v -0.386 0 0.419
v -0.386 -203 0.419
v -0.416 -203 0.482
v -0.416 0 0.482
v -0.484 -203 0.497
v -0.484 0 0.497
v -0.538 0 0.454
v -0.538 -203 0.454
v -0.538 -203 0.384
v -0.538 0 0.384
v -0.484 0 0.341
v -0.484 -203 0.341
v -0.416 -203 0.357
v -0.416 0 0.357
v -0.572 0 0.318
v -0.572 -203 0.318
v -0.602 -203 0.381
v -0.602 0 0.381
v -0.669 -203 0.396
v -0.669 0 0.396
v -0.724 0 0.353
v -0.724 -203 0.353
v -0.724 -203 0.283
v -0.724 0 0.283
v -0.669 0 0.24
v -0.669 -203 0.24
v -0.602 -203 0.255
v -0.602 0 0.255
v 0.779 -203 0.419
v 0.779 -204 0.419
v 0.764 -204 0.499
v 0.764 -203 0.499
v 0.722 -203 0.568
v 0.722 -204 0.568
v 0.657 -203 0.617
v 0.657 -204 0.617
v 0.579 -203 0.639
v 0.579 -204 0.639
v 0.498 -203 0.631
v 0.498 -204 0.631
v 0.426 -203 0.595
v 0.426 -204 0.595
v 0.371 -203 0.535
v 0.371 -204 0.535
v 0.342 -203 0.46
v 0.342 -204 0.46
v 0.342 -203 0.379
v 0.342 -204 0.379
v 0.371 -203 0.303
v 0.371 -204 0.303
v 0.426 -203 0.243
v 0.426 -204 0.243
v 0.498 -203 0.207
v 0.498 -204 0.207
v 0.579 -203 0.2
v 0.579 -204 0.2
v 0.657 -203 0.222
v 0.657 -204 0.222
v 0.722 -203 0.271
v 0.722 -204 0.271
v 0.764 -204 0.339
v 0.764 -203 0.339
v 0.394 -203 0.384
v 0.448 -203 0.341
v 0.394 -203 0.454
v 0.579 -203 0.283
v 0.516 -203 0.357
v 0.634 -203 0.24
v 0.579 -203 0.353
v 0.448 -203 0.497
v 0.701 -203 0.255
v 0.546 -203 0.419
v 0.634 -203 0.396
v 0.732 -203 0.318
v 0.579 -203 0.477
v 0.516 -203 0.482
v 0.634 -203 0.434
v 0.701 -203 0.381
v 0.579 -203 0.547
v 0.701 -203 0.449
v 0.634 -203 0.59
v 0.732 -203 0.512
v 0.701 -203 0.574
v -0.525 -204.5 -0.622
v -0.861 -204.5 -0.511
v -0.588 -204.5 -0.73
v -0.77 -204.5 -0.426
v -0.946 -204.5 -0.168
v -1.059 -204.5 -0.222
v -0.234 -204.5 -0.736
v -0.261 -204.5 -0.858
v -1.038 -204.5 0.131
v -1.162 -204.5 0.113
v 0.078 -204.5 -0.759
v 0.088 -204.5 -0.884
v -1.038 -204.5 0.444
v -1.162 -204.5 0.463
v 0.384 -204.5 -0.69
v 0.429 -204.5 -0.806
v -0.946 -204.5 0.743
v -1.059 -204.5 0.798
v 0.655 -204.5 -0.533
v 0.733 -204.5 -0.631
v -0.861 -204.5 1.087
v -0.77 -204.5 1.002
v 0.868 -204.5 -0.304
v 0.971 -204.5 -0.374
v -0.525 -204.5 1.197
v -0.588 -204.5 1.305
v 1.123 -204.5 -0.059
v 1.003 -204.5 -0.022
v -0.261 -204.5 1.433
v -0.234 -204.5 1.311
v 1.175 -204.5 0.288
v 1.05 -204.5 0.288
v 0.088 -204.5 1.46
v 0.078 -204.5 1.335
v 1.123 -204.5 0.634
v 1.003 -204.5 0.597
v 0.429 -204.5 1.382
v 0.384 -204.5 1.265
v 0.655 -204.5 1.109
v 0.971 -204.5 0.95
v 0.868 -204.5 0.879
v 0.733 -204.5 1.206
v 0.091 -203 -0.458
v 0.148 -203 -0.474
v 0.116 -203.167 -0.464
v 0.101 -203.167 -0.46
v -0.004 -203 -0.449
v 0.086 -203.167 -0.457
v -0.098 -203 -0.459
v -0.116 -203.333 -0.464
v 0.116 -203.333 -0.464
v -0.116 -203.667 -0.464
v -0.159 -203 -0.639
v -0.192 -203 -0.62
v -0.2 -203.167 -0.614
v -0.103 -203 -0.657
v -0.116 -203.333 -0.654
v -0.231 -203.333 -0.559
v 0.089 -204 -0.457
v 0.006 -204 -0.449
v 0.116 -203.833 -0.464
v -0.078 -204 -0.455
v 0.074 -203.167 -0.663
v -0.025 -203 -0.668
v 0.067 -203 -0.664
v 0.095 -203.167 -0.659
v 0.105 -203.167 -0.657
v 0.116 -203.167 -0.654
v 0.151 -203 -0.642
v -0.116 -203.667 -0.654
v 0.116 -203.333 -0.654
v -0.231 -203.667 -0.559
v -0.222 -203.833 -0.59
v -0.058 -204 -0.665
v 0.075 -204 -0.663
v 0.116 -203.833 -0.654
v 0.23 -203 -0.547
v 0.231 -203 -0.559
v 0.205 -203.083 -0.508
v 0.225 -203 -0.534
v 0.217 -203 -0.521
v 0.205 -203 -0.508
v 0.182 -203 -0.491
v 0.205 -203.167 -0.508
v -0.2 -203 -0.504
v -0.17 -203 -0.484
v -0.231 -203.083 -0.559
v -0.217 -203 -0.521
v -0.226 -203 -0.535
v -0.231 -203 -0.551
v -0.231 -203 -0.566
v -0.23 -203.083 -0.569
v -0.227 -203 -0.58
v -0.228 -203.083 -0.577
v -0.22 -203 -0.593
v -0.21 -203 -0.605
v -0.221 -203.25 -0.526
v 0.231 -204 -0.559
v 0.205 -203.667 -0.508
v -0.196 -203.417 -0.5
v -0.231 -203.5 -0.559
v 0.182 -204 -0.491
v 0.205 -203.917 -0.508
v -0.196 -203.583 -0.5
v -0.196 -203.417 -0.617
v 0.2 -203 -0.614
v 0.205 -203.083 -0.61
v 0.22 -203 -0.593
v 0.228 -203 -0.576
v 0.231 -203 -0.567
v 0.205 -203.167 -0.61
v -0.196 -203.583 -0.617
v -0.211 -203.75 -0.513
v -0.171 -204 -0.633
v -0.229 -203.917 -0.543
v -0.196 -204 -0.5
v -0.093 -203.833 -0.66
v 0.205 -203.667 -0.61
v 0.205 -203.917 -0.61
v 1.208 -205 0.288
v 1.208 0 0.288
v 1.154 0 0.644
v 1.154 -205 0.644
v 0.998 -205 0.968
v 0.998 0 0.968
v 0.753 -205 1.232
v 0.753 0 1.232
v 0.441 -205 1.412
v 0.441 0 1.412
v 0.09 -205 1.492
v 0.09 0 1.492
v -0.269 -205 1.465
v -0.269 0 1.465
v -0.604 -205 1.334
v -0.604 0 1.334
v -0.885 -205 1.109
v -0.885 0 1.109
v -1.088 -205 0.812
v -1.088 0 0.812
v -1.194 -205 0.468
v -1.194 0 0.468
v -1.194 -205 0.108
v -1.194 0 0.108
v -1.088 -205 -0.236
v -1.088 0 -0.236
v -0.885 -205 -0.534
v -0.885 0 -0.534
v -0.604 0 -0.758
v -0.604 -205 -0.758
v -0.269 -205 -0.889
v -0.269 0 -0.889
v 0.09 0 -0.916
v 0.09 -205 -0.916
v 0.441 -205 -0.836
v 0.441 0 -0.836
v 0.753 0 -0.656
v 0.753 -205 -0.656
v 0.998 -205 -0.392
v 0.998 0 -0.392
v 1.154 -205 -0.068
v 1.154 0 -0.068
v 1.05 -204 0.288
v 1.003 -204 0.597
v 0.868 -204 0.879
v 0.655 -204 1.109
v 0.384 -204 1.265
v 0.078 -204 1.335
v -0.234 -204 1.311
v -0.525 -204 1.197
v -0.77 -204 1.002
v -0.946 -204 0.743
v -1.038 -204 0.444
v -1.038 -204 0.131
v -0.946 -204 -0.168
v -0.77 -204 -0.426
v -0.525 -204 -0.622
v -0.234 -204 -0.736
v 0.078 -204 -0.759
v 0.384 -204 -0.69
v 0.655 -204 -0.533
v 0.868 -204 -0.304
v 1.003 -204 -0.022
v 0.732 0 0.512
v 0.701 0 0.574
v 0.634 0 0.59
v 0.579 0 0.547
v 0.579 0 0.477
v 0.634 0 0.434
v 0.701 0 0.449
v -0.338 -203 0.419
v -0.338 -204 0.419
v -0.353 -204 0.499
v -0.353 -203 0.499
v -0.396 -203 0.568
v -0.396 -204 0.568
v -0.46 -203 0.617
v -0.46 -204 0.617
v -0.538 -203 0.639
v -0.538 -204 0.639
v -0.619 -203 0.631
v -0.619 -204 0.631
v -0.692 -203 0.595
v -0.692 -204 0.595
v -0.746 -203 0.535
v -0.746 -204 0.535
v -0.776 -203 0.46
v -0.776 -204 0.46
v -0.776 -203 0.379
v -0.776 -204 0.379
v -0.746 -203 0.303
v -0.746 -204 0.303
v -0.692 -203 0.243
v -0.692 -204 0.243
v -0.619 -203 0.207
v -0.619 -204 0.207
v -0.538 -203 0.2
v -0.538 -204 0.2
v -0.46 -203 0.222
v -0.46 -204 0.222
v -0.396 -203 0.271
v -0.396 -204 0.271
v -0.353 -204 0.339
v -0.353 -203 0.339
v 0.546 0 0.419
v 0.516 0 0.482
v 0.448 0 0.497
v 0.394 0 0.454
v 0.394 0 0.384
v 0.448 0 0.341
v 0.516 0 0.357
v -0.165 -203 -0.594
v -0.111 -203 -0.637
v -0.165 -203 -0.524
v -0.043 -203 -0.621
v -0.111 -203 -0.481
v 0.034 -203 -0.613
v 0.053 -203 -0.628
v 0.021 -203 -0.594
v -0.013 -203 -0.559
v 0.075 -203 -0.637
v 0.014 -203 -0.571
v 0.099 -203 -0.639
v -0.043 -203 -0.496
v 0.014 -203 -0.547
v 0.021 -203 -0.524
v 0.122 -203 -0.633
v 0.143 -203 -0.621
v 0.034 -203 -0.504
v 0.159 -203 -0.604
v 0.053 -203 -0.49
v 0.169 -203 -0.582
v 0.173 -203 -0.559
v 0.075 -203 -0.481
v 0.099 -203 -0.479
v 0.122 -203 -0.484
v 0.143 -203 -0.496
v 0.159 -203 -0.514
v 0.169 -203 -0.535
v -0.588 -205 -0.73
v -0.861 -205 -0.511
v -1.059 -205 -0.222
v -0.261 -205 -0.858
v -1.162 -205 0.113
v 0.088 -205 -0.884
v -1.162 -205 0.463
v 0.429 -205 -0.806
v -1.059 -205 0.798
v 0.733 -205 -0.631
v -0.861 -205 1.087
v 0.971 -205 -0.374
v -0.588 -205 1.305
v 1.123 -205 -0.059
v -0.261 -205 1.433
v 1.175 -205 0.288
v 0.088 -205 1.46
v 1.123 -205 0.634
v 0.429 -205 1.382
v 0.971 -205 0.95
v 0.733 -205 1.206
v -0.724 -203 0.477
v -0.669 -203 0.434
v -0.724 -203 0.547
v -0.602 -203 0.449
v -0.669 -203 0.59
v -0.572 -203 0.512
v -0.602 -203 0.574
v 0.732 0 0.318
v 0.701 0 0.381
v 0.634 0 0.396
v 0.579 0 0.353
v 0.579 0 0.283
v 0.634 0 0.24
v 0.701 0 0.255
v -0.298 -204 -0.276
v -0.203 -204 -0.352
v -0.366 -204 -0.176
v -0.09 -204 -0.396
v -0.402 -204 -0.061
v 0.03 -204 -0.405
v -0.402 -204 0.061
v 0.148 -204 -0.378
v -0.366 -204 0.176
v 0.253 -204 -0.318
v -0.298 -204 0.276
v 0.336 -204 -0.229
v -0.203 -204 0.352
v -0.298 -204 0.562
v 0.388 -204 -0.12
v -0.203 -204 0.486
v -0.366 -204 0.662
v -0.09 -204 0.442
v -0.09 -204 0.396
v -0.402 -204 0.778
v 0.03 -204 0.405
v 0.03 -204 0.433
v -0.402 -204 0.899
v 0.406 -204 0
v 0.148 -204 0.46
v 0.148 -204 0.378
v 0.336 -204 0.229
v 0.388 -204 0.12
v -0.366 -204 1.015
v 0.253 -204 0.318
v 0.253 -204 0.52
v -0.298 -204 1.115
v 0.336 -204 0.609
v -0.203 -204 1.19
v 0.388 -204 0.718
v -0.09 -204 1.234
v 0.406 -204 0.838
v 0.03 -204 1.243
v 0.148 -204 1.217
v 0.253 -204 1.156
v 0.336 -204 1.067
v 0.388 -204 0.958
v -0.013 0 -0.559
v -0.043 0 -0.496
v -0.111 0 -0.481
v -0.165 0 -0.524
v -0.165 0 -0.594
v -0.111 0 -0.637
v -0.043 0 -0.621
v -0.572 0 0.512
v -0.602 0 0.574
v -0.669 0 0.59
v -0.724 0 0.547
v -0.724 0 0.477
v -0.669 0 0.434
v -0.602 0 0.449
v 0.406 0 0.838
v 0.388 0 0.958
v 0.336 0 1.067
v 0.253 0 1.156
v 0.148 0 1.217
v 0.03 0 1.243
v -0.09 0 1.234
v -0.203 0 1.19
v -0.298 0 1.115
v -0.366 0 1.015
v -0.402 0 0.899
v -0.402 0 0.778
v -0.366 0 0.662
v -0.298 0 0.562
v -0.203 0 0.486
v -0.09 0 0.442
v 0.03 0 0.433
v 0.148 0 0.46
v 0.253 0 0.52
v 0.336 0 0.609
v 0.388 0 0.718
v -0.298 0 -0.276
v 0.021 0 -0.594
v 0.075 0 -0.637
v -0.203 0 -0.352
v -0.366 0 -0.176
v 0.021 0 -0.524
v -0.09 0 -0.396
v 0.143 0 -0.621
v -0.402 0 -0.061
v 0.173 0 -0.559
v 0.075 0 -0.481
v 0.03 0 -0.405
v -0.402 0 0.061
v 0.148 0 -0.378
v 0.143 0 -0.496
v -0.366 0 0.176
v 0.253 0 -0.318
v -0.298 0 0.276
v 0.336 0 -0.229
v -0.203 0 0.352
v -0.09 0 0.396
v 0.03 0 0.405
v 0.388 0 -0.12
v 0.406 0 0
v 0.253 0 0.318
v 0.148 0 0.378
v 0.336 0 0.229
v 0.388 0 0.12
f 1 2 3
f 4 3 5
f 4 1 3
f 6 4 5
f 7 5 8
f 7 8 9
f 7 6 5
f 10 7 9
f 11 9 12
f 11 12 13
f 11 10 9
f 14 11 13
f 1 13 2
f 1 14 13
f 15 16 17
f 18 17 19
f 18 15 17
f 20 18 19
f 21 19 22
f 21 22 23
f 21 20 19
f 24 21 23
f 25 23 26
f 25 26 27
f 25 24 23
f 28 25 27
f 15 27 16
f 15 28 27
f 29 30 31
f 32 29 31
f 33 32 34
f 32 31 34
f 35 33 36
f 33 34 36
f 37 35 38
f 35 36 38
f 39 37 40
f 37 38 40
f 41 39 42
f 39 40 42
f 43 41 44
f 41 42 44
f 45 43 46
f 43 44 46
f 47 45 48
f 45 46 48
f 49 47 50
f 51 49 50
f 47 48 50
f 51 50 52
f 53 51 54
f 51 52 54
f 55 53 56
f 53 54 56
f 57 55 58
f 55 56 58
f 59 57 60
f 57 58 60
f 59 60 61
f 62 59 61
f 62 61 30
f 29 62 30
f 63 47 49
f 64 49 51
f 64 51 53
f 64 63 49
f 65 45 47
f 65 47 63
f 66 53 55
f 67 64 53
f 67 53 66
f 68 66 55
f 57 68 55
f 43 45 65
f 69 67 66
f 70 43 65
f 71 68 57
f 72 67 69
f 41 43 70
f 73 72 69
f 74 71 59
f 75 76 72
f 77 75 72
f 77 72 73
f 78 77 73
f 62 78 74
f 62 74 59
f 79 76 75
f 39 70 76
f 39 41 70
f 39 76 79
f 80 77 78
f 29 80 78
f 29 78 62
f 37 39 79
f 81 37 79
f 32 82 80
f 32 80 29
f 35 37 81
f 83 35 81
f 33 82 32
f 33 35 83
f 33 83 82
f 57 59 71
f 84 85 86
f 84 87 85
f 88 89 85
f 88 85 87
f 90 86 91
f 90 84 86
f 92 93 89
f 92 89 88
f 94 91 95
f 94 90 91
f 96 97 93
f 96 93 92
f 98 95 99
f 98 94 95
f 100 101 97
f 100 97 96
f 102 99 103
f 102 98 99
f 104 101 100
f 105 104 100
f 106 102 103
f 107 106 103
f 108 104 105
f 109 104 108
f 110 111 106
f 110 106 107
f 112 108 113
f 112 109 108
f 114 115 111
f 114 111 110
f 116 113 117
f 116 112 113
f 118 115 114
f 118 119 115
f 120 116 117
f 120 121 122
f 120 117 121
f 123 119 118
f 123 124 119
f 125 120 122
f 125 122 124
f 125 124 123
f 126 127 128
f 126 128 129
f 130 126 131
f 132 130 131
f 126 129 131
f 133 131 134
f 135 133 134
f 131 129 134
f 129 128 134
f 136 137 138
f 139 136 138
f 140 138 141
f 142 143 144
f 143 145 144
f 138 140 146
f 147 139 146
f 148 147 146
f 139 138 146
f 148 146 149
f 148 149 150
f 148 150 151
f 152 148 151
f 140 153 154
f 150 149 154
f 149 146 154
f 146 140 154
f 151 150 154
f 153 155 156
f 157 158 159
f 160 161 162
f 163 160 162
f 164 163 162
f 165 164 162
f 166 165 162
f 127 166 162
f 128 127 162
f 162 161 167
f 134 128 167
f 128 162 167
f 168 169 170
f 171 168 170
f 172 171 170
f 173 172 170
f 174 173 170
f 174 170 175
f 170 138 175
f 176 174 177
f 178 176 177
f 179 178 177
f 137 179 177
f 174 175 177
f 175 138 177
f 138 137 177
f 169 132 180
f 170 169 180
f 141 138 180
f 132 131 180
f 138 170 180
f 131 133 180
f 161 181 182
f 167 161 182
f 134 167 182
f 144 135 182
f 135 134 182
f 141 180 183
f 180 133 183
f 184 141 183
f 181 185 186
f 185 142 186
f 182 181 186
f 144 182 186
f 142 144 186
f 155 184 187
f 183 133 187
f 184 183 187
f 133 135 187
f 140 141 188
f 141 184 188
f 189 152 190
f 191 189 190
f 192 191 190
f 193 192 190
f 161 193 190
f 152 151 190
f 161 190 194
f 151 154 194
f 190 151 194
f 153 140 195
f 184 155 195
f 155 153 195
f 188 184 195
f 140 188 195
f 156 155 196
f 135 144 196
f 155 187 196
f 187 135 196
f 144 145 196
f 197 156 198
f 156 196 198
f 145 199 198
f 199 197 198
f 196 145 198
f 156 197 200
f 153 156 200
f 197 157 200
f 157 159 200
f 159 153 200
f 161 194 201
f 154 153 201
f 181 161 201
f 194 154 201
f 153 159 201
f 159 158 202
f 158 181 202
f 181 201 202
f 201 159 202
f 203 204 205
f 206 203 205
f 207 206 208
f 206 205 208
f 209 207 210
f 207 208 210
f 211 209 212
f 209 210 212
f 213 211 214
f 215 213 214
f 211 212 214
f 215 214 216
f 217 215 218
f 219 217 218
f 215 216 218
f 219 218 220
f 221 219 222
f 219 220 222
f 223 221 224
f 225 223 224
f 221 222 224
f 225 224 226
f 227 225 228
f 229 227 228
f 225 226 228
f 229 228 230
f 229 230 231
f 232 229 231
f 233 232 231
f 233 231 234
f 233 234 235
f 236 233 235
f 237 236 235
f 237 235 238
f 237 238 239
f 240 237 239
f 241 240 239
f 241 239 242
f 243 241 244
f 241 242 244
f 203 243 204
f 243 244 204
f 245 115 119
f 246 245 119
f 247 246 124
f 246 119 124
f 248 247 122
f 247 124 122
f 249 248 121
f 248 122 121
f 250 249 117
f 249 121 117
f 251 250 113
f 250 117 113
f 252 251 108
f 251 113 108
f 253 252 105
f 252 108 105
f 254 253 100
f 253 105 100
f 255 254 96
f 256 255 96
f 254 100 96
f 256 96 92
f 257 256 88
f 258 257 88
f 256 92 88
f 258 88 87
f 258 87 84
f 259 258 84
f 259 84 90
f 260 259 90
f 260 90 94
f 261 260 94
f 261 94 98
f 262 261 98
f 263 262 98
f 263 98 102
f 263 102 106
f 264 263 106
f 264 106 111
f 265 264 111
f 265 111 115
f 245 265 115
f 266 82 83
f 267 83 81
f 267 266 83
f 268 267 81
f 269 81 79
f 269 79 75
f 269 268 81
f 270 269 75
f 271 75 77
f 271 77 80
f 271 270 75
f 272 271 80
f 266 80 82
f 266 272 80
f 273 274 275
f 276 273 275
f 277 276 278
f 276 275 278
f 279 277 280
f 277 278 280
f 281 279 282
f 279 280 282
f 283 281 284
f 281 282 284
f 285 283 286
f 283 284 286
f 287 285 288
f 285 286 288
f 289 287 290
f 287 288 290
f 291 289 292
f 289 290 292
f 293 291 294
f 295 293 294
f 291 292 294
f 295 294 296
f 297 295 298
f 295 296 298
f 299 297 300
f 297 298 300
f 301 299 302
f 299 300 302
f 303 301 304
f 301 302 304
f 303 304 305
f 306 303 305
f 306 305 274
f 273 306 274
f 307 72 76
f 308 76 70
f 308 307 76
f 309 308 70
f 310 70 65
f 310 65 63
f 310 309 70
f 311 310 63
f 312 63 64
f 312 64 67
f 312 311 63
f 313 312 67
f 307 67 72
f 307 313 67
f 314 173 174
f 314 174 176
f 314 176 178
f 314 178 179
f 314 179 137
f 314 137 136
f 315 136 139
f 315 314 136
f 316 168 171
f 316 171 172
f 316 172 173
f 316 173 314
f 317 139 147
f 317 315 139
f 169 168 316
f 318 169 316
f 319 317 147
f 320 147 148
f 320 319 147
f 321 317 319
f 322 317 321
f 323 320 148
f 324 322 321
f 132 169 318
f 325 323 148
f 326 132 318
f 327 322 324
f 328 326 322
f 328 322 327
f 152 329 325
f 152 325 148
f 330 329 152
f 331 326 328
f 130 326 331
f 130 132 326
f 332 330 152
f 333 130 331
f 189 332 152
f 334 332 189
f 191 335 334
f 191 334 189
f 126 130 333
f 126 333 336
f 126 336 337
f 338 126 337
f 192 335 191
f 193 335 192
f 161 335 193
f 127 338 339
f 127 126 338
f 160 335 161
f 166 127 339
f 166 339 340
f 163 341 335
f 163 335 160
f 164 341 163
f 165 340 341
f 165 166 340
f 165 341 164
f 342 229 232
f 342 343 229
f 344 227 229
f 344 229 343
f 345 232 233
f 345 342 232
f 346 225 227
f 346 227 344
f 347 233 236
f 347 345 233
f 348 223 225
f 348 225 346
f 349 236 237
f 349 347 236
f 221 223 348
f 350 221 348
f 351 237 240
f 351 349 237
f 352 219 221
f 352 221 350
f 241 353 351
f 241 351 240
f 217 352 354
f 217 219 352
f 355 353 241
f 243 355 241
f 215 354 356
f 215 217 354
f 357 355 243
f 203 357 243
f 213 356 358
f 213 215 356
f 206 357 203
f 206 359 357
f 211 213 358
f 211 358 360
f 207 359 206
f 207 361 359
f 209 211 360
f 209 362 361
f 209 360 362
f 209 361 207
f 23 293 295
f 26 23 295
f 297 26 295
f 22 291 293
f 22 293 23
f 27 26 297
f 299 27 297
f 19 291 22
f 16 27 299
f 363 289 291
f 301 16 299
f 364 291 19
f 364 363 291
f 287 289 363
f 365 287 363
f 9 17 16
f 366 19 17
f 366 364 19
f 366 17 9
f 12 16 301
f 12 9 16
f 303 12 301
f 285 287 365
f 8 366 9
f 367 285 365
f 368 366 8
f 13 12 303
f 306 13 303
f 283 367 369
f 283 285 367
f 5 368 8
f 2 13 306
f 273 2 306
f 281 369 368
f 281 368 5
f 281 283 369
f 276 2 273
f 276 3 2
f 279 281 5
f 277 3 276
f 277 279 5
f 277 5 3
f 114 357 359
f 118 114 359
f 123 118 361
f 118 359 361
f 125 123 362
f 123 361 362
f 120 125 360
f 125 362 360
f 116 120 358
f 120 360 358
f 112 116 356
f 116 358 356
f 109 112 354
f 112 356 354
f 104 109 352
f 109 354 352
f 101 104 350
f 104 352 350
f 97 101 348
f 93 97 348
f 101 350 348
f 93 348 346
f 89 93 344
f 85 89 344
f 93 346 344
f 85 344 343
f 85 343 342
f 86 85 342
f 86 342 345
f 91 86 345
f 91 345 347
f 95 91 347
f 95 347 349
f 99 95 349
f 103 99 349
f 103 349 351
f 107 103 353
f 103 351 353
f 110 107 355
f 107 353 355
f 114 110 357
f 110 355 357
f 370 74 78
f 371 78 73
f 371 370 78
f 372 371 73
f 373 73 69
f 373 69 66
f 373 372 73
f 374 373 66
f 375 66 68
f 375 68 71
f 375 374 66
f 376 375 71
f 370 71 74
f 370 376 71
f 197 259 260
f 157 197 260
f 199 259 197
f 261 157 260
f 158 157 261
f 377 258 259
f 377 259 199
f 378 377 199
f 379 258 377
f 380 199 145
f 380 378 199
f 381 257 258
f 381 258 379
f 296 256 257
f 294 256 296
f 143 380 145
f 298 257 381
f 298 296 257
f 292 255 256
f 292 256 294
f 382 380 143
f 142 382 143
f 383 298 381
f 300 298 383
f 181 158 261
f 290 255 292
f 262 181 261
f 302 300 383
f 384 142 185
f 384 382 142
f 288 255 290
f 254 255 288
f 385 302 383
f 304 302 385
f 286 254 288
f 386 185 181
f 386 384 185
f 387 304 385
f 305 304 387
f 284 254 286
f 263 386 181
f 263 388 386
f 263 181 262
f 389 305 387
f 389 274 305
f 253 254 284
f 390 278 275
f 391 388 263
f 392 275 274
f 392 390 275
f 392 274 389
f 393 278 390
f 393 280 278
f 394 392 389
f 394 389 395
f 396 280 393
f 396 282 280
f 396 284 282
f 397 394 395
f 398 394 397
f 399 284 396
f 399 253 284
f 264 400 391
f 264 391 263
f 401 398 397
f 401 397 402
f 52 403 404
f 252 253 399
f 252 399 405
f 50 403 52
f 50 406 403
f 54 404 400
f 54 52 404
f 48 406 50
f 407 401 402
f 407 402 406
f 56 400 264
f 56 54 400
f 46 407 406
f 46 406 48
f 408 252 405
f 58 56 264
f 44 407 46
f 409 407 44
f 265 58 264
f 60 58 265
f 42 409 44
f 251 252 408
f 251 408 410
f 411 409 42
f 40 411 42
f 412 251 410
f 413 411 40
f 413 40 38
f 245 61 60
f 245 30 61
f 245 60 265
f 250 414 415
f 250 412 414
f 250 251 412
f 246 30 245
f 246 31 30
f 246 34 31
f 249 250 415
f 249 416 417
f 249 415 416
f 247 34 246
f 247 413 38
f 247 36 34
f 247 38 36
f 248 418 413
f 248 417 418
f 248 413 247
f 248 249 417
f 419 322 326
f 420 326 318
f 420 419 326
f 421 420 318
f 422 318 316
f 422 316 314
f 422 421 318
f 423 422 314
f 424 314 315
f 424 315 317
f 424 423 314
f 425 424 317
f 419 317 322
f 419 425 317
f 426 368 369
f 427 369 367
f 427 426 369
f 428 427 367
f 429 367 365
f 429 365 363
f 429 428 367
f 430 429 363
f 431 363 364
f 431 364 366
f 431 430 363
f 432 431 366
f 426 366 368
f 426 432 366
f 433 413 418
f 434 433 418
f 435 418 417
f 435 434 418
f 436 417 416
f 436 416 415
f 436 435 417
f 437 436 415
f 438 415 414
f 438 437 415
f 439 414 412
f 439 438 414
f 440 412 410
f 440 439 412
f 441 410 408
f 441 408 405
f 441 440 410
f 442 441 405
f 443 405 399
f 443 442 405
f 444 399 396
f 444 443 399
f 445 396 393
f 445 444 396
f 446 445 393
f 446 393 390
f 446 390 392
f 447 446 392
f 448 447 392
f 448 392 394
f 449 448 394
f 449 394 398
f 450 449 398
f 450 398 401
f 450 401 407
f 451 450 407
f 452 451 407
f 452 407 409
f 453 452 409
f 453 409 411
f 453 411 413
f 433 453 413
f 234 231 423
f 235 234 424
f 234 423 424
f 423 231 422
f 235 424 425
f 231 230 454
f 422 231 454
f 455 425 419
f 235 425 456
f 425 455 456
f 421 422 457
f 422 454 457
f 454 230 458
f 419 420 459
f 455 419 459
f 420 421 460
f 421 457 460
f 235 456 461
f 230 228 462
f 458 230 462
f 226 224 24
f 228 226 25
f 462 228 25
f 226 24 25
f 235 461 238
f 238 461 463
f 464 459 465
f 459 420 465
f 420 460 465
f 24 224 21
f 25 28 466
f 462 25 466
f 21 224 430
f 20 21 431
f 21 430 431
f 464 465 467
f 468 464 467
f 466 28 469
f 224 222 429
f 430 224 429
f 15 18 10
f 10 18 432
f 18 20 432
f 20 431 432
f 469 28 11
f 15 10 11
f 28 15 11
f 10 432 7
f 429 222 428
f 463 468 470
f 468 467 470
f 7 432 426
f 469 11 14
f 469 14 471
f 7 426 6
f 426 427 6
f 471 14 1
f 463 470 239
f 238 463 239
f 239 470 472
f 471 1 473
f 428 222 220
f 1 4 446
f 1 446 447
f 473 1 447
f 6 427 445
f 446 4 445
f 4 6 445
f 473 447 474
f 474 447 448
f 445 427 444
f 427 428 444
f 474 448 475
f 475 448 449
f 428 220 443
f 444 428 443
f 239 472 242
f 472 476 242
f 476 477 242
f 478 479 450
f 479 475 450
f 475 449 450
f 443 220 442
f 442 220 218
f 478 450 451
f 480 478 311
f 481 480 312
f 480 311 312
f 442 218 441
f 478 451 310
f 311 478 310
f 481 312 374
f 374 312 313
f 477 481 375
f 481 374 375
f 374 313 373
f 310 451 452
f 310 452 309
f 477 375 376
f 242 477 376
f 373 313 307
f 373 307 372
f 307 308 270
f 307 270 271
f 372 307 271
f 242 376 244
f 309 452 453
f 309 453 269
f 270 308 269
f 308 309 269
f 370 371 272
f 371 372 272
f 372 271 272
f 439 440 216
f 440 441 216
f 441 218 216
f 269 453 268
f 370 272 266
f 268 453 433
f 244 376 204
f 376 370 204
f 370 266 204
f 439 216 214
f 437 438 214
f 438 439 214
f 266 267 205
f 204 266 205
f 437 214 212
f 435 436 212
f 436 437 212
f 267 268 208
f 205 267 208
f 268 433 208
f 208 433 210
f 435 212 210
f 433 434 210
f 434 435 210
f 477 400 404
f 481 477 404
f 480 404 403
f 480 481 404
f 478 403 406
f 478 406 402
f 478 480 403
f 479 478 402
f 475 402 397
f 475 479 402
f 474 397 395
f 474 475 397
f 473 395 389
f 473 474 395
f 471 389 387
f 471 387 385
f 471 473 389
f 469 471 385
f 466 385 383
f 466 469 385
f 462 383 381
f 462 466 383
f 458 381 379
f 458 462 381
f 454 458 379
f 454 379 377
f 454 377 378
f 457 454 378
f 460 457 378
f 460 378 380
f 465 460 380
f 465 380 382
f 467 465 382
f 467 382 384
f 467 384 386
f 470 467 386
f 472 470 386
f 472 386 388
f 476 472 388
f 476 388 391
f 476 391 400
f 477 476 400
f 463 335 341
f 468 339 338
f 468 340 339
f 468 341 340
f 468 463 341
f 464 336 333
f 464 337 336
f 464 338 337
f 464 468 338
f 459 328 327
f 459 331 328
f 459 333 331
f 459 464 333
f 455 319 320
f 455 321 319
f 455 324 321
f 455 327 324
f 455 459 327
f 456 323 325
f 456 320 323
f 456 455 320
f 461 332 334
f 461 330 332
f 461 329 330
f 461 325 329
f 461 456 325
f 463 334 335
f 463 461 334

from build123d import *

# Parameters (mm, degrees)
F0_R     = 1.2075
F0_R_2   = 1.2
F0_R_3   = 1.05
F0_R_4   = 0.4064
F0_R_5   = 0.2205357301
F0_R_6   = 0.08001
F1_DEPTH = 205
F2_R     = 1.05
F2_R_2   = 0.08001
F2_R_3   = 0.4064
F3_DEPTH = 1
F4_R     = 0.220535
F4_R_2   = 0.08001
F5_DEPTH = 1
F6_R     = 1.175
F6_R_2   = 1.05
F7_DEPTH = 0.5


with BuildPart() as f1:
    # F0 (on Front) → F1 (new body)
    with BuildSketch(Plane.XZ):
        with Locations((0, 0.2878)):
            Circle(F0_R)
        with Locations((0, 0.2878)):
            Circle(F0_R_2, mode=Mode.SUBTRACT)
        with Locations((0, 0.2878)):
            Circle(F0_R_2)
        with Locations((0, 0.2878)):
            Circle(F0_R_3, mode=Mode.SUBTRACT)
        with Locations((0, 0.2878)):
            Circle(F0_R_3)
        with BuildLine():
            add(Edge.make_bspline(
                [(0.2313024888, -0.5588), (0.2313024888, -0.3679270245), (-0.1156512444, -0.4633635122), (-0.4626049777, -0.5588), (-0.1156512444, -0.6542364878), (0.2313024888, -0.7496729755), (0.2313024888, -0.5588)],
                knots=[0, 0, 0, 2.0943951024, 2.0943951024, 4.1887902048, 4.1887902048, 6.2831853072, 6.2831853072, 6.2831853072], degree=2, weights=[1, 0.5, 1, 0.5, 1, 0.5, 1]))
        make_face(mode=Mode.SUBTRACT)
        Circle(F0_R_4, mode=Mode.SUBTRACT)
        with Locations((-0.5588, 0.4191)):
            Circle(F0_R_5, mode=Mode.SUBTRACT)
        with Locations((0, 0.8382)):
            Circle(F0_R_4, mode=Mode.SUBTRACT)
        with Locations((0.5588, 0.4191)):
            Circle(F0_R_5, mode=Mode.SUBTRACT)
        with Locations((-0.5588, 0.4191)):
            Circle(F0_R_5)
        with Locations((-0.65151, 0.318008)):
            Circle(F0_R_6, mode=Mode.SUBTRACT)
        with Locations((-0.65151, 0.51181)):
            Circle(F0_R_6, mode=Mode.SUBTRACT)
        with Locations((-0.46609, 0.4191)):
            Circle(F0_R_6, mode=Mode.SUBTRACT)
        with Locations((0.5588, 0.4191)):
            Circle(F0_R_5)
        with Locations((0.46609, 0.4191)):
            Circle(F0_R_6, mode=Mode.SUBTRACT)
        with Locations((0.65151, 0.318008)):
            Circle(F0_R_6, mode=Mode.SUBTRACT)
        with Locations((0.65151, 0.51181)):
            Circle(F0_R_6, mode=Mode.SUBTRACT)
        with BuildLine():
            add(Edge.make_bspline(
                [(0.2313024888, -0.5588), (0.2313024888, -0.3679270245), (-0.1156512444, -0.4633635122), (-0.4626049777, -0.5588), (-0.1156512444, -0.6542364878), (0.2313024888, -0.7496729755), (0.2313024888, -0.5588)],
                knots=[0, 0, 0, 2.0943951024, 2.0943951024, 4.1887902048, 4.1887902048, 6.2831853072, 6.2831853072, 6.2831853072], degree=2, weights=[1, 0.5, 1, 0.5, 1, 0.5, 1]))
        make_face()
        with Locations((-0.09271, -0.5588)):
            Circle(F0_R_6, mode=Mode.SUBTRACT)
        with Locations((0.09271, -0.5588)):
            Circle(F0_R_6, mode=Mode.SUBTRACT)
    extrude(amount=F1_DEPTH)

    # F2 (on face) → F3 (cut)
    with BuildSketch(Plane.XZ.offset(205)):
        with Locations((0, 0.2878)):
            Circle(F2_R)
        with Locations((-0.09271, -0.5588)):
            Circle(F2_R_2, mode=Mode.SUBTRACT)
        Circle(F2_R_3, mode=Mode.SUBTRACT)
        with Locations((0.09271, -0.5588)):
            Circle(F2_R_2, mode=Mode.SUBTRACT)
        with Locations((-0.65151, 0.318008)):
            Circle(F2_R_2, mode=Mode.SUBTRACT)
        with Locations((-0.65151, 0.51181)):
            Circle(F2_R_2, mode=Mode.SUBTRACT)
        with Locations((-0.46609, 0.4191)):
            Circle(F2_R_2, mode=Mode.SUBTRACT)
        with Locations((0, 0.8382)):
            Circle(F2_R_3, mode=Mode.SUBTRACT)
        with Locations((0.46609, 0.4191)):
            Circle(F2_R_2, mode=Mode.SUBTRACT)
        with Locations((0.65151, 0.318008)):
            Circle(F2_R_2, mode=Mode.SUBTRACT)
        with Locations((0.65151, 0.51181)):
            Circle(F2_R_2, mode=Mode.SUBTRACT)
    extrude(amount=-F3_DEPTH, mode=Mode.SUBTRACT)

    # F4 (on face) → F5 (cut)
    with BuildSketch(Plane.XZ.offset(204)):
        with Locations((-0.5588, 0.4191)):
            Circle(F4_R)
        with Locations((-0.65151, 0.318008)):
            Circle(F4_R_2, mode=Mode.SUBTRACT)
        with Locations((-0.65151, 0.51181)):
            Circle(F4_R_2, mode=Mode.SUBTRACT)
        with Locations((-0.46609, 0.4191)):
            Circle(F4_R_2, mode=Mode.SUBTRACT)
        with Locations((0.5588, 0.4191)):
            Circle(F4_R)
        with Locations((0.46609, 0.4191)):
            Circle(F4_R_2, mode=Mode.SUBTRACT)
        with Locations((0.65151, 0.318008)):
            Circle(F4_R_2, mode=Mode.SUBTRACT)
        with Locations((0.65151, 0.51181)):
            Circle(F4_R_2, mode=Mode.SUBTRACT)
        with BuildLine():
            add(Edge.make_bspline(
                [(0.2313, -0.5588), (0.2313, -0.3682744112), (-0.11565, -0.4635372056), (-0.4626, -0.5588), (-0.11565, -0.6540627944), (0.2313, -0.7493255888), (0.2313, -0.5588)],
                knots=[0, 0, 0, 2.0943951024, 2.0943951024, 4.1887902048, 4.1887902048, 6.2831853072, 6.2831853072, 6.2831853072], degree=2, weights=[1, 0.5, 1, 0.5, 1, 0.5, 1]))
        make_face()
        with Locations((-0.09271, -0.5588)):
            Circle(F4_R_2, mode=Mode.SUBTRACT)
        with BuildLine():
            ThreePointArc((0.0127, -0.5588), (0.09271, -0.47879), (0.17272, -0.5588))
            ThreePointArc((0.17272, -0.5588), (0.09271, -0.63881), (0.0127, -0.5588))
        make_face(mode=Mode.SUBTRACT)
    extrude(amount=-F5_DEPTH, mode=Mode.SUBTRACT)

    # F6 (on face) → F7 (cut)
    with BuildSketch(Plane.XZ.offset(205)):
        with Locations((0, 0.2878)):
            Circle(F6_R)
        with Locations((0, 0.2878)):
            Circle(F6_R_2, mode=Mode.SUBTRACT)
    extrude(amount=-F7_DEPTH, mode=Mode.SUBTRACT)


solid = f1.part
